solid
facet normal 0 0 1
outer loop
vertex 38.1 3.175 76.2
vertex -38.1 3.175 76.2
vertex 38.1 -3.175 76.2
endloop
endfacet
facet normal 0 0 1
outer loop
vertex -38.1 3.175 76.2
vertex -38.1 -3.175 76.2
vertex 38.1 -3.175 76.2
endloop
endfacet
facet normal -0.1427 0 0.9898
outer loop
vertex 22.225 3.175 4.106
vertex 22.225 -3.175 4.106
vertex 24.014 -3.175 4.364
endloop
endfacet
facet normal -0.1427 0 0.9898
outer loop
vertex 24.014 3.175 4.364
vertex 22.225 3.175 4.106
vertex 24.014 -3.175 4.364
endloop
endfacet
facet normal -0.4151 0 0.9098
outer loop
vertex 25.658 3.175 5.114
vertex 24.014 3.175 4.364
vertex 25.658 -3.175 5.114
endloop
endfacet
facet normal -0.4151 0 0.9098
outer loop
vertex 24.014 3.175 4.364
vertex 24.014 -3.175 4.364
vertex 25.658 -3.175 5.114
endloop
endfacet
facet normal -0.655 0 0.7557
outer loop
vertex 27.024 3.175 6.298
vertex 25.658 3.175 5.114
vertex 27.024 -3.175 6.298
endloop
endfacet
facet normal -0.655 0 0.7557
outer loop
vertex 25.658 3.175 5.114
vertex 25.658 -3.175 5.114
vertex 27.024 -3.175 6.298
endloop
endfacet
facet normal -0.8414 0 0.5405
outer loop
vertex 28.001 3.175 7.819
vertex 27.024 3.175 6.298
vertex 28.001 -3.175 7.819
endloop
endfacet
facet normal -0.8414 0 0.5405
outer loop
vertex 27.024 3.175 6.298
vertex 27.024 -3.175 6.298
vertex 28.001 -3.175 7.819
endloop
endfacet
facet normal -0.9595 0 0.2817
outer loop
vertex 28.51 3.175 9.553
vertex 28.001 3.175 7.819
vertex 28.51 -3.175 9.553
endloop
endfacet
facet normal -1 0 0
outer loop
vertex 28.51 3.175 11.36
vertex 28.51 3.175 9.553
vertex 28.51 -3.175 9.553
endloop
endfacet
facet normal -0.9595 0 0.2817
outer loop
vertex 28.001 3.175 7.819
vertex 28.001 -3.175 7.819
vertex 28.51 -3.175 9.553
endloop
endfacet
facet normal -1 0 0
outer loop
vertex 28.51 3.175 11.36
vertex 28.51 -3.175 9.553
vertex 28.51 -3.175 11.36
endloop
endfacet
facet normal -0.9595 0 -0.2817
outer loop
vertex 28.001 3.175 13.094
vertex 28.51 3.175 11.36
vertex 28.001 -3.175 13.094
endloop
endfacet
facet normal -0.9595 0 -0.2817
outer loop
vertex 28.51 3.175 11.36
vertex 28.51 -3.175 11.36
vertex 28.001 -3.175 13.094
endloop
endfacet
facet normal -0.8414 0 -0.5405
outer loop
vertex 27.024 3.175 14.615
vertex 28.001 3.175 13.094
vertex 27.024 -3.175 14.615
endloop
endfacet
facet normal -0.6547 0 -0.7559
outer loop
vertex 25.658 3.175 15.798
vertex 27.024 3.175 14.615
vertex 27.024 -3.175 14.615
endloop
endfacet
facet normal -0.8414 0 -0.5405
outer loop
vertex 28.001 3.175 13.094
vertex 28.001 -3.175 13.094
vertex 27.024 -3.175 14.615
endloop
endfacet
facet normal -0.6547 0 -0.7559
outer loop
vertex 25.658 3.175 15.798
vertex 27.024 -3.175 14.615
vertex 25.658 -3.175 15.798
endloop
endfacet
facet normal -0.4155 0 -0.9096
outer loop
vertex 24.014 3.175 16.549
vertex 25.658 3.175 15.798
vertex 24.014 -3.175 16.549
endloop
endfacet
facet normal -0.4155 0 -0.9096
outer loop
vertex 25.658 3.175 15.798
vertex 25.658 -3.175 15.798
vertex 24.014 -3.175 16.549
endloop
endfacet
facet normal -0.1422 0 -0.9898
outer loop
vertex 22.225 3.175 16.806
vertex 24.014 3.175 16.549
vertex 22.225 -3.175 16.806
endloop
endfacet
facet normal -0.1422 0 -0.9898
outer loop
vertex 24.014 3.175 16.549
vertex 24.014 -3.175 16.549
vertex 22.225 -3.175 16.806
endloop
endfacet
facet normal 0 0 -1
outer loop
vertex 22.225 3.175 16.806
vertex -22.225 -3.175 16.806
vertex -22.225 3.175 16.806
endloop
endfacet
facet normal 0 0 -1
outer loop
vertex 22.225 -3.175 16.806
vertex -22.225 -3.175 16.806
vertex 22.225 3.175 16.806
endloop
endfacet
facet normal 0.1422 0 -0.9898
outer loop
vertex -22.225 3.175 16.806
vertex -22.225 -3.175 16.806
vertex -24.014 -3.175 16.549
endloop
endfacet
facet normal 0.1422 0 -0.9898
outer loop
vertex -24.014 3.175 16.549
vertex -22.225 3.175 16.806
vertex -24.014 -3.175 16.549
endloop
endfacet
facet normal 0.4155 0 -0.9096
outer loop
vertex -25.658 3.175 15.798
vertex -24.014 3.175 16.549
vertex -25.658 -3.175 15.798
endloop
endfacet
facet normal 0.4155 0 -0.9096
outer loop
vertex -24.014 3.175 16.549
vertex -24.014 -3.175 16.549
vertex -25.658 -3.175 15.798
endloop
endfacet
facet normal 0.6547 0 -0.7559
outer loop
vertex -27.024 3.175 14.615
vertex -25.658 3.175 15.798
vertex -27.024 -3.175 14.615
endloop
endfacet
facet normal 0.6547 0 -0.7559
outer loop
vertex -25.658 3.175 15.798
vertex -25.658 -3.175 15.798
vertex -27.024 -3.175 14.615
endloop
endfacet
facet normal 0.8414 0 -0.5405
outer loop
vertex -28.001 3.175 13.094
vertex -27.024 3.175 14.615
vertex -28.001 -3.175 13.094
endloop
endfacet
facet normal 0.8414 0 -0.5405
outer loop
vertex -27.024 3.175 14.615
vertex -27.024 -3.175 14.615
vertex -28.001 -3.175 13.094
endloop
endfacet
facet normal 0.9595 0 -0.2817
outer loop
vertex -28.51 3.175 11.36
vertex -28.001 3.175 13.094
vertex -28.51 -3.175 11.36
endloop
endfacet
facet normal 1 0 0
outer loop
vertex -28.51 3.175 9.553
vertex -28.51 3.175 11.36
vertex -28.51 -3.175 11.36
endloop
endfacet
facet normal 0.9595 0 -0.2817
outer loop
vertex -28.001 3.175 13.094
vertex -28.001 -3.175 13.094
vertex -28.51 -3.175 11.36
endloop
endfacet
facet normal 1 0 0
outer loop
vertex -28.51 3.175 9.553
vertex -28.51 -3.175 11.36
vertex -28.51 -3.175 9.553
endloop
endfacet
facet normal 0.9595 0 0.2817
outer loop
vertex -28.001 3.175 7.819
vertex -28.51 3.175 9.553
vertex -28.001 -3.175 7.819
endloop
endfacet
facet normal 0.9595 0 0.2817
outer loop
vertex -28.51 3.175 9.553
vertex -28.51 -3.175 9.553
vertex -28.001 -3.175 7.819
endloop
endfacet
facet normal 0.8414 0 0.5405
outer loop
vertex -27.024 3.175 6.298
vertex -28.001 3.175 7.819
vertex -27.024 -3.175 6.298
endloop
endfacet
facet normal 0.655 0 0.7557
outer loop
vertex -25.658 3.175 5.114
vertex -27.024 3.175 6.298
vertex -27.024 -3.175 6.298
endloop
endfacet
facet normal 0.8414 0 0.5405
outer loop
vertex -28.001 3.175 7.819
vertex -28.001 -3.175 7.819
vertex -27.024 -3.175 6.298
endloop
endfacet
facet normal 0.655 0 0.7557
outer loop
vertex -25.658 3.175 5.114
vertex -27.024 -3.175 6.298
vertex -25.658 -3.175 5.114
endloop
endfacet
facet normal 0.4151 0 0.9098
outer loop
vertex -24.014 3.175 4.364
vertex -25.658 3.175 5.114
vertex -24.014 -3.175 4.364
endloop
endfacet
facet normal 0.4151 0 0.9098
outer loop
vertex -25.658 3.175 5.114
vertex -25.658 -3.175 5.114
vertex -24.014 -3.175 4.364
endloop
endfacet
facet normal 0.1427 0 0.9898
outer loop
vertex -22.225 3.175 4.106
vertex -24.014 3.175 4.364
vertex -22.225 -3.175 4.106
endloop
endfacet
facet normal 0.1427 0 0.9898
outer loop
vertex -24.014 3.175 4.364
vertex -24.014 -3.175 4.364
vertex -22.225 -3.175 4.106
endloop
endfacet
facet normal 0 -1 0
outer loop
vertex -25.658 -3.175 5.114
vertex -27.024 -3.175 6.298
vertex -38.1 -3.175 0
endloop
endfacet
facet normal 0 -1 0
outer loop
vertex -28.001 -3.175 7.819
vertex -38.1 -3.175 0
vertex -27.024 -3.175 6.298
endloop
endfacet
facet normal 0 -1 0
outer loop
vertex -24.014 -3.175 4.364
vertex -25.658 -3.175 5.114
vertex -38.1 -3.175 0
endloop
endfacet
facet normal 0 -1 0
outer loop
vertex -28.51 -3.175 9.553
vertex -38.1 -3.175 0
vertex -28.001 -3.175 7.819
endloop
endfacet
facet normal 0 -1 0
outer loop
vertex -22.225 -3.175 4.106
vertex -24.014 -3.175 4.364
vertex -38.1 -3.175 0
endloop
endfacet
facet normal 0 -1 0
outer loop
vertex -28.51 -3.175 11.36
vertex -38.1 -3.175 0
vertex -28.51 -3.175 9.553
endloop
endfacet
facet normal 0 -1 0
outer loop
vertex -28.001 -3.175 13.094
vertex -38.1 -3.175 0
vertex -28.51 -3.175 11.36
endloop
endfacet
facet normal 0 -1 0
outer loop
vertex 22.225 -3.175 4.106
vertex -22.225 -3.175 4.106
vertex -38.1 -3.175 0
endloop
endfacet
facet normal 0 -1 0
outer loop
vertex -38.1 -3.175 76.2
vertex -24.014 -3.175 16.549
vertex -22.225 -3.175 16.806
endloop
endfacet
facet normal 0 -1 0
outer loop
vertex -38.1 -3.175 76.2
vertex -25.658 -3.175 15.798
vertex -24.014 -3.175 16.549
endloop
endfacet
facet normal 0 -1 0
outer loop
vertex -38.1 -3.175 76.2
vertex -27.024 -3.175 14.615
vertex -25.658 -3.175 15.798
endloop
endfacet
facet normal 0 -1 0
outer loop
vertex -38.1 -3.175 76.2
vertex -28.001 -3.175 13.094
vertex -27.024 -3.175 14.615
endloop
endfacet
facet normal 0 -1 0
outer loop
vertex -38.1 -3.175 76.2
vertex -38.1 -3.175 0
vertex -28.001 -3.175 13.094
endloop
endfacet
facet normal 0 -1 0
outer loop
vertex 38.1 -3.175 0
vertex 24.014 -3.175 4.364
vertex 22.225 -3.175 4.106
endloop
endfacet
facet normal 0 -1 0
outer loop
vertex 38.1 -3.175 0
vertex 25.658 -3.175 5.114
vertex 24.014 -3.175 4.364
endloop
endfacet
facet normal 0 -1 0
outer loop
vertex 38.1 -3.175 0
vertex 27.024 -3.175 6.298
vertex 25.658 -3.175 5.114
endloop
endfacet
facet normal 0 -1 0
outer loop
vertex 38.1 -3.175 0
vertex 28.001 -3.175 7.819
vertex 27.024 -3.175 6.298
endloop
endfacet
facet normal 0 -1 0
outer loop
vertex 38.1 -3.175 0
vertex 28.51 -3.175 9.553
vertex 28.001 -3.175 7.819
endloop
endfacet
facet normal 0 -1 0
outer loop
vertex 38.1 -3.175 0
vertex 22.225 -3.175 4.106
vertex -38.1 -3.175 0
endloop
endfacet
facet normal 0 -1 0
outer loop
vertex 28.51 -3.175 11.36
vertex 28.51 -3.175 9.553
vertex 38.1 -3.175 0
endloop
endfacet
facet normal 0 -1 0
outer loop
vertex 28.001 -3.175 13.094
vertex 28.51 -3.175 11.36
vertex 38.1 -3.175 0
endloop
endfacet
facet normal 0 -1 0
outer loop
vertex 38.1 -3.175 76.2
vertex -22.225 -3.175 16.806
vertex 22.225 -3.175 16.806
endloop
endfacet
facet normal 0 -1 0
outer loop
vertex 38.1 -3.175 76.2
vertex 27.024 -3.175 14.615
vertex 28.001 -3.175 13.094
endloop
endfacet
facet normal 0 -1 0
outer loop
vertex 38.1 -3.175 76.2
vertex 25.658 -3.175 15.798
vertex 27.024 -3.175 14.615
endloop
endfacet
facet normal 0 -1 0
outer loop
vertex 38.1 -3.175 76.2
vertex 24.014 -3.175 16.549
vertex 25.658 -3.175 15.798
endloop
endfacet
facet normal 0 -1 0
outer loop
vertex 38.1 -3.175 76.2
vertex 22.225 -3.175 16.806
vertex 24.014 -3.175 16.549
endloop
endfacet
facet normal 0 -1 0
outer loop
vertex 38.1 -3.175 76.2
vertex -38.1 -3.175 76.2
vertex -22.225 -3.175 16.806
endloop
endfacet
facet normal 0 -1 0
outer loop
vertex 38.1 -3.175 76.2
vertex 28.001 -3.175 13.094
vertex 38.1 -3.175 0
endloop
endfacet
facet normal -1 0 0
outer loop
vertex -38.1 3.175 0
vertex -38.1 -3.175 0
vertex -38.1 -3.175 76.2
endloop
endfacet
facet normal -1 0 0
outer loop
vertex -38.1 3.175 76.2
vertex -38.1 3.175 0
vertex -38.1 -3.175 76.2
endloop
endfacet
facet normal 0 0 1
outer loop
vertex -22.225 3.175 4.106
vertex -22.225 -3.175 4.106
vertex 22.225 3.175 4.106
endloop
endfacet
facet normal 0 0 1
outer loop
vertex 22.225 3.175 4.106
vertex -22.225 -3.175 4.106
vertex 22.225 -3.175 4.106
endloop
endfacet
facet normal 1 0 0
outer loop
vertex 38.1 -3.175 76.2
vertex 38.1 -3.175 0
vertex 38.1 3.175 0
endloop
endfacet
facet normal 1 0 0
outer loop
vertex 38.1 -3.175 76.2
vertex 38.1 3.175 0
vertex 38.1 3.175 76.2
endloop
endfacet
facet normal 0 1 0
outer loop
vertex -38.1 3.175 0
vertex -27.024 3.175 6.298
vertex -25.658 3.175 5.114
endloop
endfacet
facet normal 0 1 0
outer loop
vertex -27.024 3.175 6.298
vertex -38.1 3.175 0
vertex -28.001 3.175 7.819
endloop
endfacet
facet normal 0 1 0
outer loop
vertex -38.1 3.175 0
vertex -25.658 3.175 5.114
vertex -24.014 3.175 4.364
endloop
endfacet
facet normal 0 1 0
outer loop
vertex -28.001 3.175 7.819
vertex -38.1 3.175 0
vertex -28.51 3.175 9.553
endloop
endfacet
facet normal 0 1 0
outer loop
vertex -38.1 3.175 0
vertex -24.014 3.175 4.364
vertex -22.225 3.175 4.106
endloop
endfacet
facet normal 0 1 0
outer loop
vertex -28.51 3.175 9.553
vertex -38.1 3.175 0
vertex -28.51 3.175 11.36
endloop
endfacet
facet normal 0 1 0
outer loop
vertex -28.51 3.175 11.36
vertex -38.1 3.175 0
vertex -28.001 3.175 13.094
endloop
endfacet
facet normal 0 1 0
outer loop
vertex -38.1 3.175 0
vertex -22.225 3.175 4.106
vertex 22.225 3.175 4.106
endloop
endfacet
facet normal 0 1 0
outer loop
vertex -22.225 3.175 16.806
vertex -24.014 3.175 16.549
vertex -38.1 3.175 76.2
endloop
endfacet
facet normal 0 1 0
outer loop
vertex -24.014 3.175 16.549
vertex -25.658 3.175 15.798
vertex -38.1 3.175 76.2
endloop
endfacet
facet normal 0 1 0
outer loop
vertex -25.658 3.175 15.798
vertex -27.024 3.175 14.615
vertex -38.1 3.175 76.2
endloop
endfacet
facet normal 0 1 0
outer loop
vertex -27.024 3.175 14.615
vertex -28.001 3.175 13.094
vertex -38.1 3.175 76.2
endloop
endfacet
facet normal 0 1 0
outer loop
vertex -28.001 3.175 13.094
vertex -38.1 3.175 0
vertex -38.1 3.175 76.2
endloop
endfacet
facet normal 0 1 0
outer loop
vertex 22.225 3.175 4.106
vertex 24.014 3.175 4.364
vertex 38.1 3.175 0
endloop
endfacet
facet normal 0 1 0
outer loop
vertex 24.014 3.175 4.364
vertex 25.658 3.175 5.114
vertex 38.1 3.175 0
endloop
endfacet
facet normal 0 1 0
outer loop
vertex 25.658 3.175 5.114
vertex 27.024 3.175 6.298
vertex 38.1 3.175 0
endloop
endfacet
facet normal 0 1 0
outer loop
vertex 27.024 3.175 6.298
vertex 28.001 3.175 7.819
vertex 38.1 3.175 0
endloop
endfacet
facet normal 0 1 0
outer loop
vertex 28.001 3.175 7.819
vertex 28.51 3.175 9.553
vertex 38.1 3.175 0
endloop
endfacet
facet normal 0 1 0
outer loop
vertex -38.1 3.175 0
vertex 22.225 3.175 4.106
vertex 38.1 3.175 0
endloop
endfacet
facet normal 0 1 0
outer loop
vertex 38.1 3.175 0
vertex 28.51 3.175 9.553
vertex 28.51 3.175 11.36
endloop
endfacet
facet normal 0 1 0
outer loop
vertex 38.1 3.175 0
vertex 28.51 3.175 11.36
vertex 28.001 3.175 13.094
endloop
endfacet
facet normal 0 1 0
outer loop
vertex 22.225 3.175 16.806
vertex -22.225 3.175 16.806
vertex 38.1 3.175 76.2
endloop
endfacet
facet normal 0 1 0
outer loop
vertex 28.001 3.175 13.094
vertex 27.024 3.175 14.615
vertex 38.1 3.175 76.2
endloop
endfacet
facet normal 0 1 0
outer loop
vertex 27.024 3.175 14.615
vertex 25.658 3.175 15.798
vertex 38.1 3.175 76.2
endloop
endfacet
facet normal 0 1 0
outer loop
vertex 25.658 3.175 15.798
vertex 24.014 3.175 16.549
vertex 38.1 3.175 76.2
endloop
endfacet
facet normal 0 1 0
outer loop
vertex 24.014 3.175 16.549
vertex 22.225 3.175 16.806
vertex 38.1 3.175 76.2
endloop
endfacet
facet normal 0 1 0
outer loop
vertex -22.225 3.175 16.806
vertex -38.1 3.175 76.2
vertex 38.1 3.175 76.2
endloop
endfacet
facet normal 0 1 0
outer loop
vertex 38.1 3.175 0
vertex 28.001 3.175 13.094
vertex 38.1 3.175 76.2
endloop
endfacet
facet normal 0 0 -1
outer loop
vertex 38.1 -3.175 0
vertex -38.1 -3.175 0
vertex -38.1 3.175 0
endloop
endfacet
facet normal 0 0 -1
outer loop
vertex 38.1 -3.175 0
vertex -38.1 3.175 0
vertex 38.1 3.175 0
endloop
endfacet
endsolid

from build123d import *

# Parameters (mm, degrees)
F0_W     = 76.2
F0_H     = 76.2
F1_DEPTH = 3.175
F2_W     = 44.45
F2_H     = 12.7
F3_DEPTH = 6.35


with BuildPart() as f1:
    # F0 (on Front) → F1 (new body, symmetric)
    with BuildSketch(Plane.XZ):
        with Locations((0, 38.1)):
            Rectangle(F0_W, F0_H)
    extrude(amount=F1_DEPTH, both=True)

    # F2 (on face) → F3 (cut)
    with BuildSketch(Plane.XZ.offset(3.175)):
        with BuildLine():
            Line((-22.225, 4.1064423469), (-22.225, 16.8064423469))
            ThreePointArc((-22.225, 16.8064423469), (-28.575, 10.4564423469), (-22.225, 4.1064423469))
        make_face()
        with Locations((0, 10.4564423469)):
            Rectangle(F2_W, F2_H)
        with BuildLine():
            ThreePointArc((22.225, 4.1064423469), (28.575, 10.4564423469), (22.225, 16.8064423469))
            Line((22.225, 16.8064423469), (22.225, 4.1064423469))
        make_face()
    extrude(amount=-F3_DEPTH, mode=Mode.SUBTRACT)


solid = f1.part
